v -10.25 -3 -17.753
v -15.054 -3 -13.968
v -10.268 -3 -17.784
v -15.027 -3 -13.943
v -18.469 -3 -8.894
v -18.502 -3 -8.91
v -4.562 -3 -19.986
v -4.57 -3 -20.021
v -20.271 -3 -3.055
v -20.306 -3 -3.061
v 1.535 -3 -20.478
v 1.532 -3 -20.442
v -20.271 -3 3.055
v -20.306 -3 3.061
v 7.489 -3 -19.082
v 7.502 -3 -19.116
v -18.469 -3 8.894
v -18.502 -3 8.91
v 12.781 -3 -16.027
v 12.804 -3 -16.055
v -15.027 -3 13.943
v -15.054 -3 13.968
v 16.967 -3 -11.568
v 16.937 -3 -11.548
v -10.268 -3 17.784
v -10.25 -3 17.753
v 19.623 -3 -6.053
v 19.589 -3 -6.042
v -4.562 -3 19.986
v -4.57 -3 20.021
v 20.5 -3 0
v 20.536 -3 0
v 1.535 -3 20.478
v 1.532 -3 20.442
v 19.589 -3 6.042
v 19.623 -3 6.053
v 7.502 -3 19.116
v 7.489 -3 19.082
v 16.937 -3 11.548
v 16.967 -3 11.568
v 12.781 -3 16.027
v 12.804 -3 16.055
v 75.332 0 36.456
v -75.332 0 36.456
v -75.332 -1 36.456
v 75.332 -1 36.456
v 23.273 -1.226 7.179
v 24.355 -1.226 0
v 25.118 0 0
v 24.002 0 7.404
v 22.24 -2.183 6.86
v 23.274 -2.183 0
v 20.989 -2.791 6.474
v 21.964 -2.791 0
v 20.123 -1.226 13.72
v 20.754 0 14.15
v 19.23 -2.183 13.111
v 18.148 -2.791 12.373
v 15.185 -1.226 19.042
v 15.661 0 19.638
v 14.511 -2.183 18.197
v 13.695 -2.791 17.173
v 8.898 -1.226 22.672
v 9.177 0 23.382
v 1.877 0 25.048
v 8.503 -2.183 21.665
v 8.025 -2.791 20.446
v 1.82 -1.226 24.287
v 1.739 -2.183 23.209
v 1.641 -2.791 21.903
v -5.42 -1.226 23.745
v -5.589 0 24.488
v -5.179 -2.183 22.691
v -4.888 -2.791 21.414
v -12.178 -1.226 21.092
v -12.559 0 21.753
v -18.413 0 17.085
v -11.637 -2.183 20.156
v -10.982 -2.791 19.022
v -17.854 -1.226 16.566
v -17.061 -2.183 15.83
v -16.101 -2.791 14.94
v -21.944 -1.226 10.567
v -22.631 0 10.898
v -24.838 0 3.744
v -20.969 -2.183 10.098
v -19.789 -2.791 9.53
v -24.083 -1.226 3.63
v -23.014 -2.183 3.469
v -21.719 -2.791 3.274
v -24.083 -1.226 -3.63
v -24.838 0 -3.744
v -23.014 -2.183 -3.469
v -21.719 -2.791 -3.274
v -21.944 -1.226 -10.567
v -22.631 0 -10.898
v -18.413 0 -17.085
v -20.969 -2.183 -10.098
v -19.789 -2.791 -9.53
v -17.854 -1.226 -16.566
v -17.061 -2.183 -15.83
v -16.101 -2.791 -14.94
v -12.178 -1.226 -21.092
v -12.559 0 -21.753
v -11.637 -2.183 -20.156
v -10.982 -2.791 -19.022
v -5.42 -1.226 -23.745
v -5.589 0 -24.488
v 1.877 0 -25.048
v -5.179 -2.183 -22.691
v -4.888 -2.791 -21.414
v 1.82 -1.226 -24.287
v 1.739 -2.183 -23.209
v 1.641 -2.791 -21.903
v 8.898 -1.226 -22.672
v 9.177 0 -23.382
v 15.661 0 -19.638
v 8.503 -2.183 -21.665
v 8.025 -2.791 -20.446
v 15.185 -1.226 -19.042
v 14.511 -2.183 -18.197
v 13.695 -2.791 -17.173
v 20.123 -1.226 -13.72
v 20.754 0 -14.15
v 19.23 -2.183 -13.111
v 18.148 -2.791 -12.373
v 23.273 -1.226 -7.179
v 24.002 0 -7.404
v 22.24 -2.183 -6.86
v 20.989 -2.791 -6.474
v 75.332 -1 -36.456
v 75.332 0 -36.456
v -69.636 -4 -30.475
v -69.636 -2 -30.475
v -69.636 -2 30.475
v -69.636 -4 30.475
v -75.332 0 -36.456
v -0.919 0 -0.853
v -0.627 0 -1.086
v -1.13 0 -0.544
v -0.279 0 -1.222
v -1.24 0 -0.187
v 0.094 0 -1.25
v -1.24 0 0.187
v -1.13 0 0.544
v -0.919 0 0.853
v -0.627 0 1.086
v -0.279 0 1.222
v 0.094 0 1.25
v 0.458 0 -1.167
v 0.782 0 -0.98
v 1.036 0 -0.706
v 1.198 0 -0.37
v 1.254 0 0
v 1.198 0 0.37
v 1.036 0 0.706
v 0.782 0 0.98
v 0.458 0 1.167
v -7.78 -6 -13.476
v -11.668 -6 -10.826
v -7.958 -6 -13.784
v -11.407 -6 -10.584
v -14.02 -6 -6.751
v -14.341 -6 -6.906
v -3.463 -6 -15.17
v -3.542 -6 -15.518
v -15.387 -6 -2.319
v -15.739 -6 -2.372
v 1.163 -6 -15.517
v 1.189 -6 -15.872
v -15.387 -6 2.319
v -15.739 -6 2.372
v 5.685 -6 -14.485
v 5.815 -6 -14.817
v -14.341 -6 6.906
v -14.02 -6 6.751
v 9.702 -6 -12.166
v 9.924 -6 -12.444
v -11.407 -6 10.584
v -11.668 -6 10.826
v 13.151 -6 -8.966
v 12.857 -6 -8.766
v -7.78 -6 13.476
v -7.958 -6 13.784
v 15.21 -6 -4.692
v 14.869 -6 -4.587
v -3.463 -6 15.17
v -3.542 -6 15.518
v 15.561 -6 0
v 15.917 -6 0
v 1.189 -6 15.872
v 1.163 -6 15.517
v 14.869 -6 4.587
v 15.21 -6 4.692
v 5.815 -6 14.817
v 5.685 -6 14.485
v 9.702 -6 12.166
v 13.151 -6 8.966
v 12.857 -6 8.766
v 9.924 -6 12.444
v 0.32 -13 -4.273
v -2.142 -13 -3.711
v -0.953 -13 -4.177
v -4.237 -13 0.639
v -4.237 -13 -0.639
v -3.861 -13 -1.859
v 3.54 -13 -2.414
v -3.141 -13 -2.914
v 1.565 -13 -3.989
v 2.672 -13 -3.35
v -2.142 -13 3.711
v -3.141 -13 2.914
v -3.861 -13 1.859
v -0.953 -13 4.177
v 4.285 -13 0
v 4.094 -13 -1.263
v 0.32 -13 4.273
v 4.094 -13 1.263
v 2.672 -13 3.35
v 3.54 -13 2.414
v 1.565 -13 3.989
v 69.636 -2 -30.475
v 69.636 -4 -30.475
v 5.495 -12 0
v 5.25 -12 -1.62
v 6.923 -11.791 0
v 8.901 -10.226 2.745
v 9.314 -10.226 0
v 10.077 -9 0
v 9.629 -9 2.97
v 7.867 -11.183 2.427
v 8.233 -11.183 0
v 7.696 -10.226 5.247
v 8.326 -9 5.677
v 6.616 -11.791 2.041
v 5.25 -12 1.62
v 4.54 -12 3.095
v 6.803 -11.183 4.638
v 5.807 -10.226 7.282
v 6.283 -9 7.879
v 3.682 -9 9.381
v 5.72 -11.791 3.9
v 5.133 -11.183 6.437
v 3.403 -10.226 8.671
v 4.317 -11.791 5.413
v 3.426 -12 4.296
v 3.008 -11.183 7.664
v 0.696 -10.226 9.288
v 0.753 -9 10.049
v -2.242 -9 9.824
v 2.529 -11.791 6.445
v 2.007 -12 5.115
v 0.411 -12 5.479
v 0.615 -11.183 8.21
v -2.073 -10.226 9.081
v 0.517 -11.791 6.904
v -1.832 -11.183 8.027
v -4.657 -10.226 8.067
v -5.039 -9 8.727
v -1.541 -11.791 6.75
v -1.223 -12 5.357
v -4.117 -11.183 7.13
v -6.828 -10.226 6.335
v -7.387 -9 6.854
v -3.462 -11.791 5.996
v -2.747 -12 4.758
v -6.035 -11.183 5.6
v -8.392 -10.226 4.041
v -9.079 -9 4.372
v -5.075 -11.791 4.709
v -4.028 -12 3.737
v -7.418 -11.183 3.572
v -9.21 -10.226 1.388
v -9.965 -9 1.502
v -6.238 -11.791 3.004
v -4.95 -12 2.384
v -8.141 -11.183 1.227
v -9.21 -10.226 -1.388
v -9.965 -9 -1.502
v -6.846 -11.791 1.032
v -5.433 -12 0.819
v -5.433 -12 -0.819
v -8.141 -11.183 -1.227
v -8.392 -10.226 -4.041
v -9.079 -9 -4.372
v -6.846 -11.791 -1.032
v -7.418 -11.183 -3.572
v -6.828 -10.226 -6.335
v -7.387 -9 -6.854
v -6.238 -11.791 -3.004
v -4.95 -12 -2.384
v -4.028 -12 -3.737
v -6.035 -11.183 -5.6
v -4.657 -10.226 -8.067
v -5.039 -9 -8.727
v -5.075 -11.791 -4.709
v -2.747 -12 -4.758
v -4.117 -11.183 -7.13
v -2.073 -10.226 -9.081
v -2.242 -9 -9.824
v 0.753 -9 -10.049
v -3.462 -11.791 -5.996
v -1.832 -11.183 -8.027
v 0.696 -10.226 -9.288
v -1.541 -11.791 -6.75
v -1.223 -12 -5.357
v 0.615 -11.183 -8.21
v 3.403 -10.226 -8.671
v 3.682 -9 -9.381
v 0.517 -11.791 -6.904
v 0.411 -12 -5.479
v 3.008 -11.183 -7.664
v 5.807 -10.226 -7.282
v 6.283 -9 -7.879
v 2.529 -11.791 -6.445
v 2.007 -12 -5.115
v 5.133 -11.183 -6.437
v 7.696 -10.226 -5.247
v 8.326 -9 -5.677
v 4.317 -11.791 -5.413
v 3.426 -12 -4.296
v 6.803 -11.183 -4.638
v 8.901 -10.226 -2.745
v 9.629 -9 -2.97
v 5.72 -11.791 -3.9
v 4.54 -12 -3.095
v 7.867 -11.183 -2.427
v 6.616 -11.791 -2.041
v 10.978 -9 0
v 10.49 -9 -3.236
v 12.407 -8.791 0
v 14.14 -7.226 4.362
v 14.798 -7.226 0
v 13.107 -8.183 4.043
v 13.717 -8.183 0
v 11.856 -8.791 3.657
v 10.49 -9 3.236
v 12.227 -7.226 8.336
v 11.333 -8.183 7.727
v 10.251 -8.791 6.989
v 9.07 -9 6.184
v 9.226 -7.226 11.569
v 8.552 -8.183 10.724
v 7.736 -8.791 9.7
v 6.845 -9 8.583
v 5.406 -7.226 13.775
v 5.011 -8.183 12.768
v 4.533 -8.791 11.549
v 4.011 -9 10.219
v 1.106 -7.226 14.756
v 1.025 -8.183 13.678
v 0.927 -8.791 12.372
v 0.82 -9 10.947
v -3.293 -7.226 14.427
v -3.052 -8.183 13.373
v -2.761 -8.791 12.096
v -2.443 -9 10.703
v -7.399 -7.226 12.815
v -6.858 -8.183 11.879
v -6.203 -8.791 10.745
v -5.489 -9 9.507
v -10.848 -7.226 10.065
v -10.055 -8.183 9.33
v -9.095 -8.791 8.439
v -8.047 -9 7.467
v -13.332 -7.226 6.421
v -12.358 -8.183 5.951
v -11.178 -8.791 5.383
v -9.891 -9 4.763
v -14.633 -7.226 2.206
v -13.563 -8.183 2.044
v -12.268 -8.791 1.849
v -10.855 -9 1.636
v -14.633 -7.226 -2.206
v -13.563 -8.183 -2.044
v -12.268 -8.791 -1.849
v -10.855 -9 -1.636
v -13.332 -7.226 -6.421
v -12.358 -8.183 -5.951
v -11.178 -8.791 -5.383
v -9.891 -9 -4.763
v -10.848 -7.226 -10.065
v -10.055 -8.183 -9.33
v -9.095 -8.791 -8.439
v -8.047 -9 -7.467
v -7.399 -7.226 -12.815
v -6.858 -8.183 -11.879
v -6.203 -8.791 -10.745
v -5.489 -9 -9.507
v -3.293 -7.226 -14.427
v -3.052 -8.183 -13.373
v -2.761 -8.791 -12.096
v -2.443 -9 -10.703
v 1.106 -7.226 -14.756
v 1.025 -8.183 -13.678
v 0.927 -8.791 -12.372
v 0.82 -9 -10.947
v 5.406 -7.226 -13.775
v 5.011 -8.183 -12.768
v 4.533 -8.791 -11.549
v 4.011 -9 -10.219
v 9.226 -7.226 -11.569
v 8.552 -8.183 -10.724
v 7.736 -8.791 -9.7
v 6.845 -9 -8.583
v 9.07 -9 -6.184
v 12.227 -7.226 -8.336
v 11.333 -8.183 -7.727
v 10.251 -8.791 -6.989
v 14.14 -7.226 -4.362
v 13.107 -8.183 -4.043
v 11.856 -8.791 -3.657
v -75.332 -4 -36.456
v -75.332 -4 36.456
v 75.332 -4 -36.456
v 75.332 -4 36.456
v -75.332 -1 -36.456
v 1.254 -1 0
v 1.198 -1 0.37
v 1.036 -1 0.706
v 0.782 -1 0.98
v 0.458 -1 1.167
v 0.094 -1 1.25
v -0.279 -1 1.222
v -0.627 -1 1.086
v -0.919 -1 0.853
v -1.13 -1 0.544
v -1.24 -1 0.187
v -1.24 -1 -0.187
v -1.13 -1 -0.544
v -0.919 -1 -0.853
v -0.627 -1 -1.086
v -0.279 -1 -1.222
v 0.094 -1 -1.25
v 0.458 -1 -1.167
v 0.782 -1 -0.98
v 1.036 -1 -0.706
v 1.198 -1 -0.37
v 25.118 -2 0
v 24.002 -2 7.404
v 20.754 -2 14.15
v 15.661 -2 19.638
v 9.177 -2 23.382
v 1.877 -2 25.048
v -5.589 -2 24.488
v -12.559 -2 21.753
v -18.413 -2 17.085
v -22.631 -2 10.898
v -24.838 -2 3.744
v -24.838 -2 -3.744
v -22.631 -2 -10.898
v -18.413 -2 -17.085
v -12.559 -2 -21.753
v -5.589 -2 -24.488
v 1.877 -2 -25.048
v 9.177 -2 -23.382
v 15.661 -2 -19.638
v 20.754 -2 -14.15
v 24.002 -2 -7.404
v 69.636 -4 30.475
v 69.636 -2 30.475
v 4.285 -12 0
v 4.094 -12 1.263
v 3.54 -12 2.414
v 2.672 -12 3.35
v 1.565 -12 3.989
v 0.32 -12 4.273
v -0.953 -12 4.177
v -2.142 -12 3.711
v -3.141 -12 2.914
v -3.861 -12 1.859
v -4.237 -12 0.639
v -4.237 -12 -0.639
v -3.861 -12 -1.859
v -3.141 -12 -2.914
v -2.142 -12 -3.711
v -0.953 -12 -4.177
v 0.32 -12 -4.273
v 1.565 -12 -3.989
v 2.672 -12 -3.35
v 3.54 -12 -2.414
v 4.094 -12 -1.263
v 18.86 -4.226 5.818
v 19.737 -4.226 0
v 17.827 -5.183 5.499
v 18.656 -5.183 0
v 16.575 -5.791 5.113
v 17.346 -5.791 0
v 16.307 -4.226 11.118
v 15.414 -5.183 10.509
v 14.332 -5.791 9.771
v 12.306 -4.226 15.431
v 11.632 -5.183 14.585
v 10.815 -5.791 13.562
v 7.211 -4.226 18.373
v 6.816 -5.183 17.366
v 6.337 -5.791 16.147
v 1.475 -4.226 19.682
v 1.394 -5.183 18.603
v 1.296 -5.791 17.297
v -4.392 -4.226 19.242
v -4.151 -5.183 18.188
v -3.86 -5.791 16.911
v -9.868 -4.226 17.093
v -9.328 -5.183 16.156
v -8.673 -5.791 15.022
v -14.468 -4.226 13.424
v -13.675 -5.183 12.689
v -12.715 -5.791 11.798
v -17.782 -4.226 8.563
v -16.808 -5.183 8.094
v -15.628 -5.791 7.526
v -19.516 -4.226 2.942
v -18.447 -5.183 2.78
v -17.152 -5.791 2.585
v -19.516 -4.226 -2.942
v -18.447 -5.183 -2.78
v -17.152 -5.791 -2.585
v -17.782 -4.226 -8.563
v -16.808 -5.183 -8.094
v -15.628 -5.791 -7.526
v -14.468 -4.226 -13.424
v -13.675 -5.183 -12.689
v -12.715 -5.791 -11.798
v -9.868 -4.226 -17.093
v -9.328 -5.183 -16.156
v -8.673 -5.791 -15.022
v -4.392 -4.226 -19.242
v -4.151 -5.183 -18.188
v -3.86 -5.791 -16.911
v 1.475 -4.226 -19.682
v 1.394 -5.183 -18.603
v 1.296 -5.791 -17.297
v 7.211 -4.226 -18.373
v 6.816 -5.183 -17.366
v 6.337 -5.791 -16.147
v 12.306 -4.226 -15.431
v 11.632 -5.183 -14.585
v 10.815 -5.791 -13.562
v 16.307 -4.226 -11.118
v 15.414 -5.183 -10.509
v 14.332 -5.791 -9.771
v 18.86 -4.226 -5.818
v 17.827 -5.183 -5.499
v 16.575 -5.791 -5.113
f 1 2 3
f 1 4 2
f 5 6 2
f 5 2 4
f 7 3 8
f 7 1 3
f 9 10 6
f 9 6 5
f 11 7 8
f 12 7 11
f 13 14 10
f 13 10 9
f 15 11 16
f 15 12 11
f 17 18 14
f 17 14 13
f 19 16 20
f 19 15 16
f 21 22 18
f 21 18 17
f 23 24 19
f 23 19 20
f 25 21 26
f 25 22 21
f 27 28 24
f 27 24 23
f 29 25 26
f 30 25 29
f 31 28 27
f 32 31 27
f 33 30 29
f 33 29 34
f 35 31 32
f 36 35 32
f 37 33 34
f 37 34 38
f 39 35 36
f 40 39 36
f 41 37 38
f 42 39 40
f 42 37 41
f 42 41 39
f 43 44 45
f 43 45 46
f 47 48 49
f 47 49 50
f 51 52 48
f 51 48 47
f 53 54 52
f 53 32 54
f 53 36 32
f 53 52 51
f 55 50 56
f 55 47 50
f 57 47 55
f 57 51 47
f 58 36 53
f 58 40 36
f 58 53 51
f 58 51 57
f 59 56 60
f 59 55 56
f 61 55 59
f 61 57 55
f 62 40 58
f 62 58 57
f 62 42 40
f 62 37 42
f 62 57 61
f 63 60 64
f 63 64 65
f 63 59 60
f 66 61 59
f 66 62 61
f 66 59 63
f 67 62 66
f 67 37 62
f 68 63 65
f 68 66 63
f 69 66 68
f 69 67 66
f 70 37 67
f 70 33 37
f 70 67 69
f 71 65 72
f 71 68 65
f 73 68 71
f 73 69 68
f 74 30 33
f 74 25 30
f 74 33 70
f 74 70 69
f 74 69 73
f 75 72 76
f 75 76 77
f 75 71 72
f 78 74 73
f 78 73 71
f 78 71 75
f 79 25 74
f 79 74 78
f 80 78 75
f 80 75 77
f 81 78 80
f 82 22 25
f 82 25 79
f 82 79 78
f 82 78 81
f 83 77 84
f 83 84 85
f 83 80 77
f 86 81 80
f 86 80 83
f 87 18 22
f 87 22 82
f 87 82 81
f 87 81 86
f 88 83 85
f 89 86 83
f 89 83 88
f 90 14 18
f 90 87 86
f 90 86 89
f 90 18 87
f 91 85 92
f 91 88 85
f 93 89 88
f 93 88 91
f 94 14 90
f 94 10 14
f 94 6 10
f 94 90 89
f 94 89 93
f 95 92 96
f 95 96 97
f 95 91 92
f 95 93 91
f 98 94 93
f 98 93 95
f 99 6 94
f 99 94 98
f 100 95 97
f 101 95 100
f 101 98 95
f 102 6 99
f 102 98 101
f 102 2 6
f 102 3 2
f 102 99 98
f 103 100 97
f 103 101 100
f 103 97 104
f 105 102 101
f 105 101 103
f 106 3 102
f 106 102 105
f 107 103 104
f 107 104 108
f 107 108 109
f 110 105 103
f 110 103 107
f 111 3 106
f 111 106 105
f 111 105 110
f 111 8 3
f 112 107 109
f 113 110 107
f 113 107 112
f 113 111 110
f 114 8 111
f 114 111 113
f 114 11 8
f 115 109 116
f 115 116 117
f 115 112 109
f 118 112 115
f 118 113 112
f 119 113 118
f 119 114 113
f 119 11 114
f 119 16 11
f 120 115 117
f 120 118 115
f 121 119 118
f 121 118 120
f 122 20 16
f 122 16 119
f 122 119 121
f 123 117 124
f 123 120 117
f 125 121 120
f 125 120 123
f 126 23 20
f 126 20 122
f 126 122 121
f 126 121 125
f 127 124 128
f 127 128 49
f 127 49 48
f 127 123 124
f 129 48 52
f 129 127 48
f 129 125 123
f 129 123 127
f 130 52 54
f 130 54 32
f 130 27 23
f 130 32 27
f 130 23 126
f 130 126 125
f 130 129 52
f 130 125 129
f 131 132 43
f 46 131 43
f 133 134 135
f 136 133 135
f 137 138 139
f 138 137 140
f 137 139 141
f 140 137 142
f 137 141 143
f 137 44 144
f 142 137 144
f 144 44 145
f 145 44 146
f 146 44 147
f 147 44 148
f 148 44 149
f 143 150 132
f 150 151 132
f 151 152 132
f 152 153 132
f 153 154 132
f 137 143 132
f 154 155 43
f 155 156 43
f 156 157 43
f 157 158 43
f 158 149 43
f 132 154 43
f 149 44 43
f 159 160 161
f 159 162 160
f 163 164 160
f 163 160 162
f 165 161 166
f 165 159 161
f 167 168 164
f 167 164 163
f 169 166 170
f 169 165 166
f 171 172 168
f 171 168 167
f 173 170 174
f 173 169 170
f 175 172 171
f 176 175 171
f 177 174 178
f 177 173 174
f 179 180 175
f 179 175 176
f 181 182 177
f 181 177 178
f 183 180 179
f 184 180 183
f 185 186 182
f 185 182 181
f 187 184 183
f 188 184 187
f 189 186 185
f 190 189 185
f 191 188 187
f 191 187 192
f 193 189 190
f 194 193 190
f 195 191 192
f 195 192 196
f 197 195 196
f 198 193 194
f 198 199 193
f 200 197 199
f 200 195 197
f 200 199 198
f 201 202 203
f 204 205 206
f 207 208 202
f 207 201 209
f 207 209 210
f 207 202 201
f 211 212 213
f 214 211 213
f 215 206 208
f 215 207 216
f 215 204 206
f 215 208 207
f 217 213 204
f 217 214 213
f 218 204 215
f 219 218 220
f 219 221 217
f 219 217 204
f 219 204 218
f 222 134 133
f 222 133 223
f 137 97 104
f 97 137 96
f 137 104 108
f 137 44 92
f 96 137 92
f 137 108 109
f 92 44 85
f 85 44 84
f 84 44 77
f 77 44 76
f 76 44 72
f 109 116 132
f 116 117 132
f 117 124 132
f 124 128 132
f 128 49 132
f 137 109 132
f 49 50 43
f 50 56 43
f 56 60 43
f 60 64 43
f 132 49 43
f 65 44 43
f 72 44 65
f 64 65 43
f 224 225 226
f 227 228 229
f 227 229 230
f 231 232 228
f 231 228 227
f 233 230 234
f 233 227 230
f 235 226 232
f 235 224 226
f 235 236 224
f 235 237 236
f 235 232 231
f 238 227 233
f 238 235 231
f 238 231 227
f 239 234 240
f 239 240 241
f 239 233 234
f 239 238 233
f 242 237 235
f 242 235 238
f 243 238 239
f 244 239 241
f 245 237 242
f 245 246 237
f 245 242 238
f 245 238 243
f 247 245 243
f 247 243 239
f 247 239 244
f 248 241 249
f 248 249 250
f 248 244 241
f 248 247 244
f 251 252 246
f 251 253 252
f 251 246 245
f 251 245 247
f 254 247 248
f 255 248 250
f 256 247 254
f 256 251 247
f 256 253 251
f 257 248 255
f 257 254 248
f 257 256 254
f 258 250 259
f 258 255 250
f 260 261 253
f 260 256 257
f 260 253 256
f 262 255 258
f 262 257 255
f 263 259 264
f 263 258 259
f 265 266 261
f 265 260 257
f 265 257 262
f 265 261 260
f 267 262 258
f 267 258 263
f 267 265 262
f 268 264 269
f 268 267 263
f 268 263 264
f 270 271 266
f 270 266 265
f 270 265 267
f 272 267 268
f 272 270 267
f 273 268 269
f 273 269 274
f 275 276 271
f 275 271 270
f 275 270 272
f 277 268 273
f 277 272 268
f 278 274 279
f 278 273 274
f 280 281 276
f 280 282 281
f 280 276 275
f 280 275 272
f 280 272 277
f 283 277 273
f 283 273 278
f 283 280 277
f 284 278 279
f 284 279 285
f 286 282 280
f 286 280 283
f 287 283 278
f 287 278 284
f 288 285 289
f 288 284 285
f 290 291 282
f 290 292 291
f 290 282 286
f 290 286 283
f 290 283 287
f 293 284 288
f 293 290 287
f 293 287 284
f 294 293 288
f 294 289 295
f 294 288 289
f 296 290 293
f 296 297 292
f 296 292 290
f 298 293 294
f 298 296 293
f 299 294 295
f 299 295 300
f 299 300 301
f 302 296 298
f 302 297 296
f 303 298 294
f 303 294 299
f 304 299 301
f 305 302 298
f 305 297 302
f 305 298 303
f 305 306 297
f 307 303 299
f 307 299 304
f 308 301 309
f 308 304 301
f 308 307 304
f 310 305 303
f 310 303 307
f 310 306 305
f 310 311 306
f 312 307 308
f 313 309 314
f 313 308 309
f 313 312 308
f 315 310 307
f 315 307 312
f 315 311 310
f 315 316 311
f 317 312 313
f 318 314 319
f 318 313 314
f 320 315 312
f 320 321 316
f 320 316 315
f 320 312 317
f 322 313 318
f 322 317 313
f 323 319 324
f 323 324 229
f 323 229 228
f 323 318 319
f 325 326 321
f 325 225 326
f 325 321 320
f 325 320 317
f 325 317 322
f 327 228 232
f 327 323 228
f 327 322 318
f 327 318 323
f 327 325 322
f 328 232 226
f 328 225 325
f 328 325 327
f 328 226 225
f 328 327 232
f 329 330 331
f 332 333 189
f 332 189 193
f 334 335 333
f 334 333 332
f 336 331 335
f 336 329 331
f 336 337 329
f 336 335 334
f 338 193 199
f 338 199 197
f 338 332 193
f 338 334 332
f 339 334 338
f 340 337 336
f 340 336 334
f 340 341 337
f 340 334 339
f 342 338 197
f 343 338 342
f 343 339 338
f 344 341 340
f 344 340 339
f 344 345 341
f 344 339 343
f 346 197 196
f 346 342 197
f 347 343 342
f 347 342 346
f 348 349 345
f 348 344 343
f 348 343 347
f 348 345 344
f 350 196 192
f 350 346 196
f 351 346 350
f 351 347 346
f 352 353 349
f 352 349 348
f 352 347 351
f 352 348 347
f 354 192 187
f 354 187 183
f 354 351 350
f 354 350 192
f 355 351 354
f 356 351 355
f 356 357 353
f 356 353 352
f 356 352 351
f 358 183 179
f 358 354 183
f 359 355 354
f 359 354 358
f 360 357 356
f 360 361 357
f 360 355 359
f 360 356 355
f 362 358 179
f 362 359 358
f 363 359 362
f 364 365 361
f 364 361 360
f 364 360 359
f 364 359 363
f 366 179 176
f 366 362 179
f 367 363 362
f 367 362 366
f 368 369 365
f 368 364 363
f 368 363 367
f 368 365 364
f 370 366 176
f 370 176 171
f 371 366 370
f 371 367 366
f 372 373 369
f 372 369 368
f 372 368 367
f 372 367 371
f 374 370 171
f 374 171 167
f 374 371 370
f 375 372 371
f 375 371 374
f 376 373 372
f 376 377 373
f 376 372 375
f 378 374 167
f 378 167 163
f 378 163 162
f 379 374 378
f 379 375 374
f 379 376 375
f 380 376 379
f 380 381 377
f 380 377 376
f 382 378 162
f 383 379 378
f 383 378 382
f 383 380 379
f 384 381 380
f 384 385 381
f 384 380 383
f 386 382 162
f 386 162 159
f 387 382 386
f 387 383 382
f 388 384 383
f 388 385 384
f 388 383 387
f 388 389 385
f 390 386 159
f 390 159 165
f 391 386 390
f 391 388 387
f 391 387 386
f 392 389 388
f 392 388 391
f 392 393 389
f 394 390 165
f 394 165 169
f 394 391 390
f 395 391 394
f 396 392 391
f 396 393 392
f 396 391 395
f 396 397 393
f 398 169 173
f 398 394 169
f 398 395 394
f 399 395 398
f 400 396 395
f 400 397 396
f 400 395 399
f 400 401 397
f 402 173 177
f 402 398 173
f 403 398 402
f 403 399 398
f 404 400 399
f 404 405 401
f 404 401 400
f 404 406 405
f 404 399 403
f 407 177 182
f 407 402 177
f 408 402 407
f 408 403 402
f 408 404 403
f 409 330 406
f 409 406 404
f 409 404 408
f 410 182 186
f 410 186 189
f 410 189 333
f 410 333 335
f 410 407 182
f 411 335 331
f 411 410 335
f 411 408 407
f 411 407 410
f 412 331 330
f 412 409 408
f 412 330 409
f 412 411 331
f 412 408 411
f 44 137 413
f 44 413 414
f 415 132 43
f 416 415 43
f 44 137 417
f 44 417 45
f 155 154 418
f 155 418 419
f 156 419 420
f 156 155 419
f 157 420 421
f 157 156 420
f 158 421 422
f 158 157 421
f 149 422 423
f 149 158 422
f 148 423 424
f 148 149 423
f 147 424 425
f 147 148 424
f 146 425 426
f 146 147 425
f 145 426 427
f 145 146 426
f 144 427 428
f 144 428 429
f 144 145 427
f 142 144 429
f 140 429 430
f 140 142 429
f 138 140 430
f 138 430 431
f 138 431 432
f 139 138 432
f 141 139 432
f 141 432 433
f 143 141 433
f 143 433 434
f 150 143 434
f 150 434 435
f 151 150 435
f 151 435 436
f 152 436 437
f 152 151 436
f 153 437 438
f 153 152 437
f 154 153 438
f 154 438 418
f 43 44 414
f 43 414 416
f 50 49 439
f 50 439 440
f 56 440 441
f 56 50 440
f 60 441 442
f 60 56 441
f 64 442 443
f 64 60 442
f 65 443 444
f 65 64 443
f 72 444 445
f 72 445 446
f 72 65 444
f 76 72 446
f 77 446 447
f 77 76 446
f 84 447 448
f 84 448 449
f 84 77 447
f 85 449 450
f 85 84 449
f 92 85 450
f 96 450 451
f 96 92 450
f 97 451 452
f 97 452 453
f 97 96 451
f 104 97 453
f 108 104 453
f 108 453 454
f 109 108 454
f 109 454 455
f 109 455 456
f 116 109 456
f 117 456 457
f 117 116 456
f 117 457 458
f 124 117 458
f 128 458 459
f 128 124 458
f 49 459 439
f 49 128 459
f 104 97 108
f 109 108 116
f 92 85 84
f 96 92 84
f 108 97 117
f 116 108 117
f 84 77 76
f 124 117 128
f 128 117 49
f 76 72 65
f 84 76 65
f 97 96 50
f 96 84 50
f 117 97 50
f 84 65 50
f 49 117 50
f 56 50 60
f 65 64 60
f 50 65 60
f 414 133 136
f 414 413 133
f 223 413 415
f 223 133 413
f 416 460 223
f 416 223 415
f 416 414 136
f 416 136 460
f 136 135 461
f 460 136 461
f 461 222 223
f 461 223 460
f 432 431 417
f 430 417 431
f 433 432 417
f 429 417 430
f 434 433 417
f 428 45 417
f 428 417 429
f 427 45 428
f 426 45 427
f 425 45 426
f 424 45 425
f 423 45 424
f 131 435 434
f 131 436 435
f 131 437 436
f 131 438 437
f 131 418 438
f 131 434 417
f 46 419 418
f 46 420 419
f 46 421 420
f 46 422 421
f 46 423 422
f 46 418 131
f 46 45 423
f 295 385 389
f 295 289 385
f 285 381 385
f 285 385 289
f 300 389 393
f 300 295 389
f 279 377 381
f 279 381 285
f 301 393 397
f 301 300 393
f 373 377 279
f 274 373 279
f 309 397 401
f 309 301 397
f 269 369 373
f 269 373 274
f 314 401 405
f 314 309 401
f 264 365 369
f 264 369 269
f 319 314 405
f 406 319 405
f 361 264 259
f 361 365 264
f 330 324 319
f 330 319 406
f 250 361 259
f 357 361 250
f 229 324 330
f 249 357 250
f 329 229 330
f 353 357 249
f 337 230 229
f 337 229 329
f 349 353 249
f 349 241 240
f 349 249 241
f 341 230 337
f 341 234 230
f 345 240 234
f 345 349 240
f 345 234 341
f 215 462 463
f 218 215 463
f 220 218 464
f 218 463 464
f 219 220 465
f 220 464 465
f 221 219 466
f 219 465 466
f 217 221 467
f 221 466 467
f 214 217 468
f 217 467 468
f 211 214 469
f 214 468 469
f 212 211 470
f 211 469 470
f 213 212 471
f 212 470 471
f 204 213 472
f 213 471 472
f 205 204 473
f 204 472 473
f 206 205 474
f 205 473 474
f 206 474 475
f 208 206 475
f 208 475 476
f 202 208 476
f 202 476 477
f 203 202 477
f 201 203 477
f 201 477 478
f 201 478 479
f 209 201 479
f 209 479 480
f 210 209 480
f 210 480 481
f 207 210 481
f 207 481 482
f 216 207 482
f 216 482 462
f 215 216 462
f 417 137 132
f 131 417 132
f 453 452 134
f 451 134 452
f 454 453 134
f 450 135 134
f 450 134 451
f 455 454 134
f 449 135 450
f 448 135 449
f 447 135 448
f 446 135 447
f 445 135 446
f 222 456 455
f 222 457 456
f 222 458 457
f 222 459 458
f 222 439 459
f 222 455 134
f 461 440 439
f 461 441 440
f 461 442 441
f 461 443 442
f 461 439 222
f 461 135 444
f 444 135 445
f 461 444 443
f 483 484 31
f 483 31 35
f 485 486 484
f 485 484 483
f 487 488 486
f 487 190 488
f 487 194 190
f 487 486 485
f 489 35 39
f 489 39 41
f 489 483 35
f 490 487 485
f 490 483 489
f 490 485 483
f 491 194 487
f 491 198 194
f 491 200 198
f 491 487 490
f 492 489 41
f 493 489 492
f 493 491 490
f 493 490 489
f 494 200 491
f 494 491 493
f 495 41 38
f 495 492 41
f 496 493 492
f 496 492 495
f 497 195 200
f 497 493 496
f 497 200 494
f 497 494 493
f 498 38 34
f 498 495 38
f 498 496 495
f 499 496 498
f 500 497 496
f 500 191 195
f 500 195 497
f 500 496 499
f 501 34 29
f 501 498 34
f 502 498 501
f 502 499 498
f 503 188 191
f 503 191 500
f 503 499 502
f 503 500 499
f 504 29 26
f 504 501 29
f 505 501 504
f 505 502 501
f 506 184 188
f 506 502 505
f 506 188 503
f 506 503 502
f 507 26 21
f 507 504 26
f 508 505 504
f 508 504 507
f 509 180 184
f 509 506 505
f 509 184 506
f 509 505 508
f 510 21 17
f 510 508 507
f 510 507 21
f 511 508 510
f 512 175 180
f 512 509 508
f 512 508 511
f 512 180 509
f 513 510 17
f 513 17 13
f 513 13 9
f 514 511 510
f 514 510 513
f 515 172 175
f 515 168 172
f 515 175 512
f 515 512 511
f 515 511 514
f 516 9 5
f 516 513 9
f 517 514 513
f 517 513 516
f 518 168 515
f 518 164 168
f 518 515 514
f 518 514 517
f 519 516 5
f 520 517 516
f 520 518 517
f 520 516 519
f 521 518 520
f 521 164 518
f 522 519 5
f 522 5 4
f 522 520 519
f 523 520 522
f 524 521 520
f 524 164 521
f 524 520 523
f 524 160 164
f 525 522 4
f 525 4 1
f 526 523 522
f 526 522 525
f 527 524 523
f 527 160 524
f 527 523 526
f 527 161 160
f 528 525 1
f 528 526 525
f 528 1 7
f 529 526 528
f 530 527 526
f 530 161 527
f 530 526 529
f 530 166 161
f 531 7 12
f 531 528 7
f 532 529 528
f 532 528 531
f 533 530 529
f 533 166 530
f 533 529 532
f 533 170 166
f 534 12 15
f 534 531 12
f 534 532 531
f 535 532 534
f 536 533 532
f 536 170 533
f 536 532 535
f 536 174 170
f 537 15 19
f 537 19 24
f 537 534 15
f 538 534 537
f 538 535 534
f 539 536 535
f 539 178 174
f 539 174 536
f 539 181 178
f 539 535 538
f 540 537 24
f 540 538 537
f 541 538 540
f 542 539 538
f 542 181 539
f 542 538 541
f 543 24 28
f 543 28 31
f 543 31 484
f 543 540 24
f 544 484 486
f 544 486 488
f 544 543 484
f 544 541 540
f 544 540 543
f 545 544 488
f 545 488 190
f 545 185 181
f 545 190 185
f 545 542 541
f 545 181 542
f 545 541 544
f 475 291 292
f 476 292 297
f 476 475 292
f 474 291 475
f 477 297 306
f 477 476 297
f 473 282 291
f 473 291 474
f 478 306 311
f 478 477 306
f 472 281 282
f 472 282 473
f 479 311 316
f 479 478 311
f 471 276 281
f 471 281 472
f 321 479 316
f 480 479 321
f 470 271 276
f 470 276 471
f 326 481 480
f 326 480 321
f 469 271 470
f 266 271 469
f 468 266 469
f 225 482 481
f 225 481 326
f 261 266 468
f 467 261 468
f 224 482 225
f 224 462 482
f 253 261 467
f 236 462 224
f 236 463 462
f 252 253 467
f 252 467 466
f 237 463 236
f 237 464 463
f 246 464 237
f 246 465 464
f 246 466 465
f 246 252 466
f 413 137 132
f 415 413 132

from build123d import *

# Parameters (mm, degrees)
F0_R      = 25.1181711361
F0_R_2    = 20.4995111856
F1_DEPTH  = 3
F0_R_3    = 15.560509686
F2_DEPTH  = 6
F0_R_4    = 10.0770984701
F3_DEPTH  = 9
F0_R_5    = 4.2848341216
F4_DEPTH  = 12
F0_R_6    = 1.2539122761
F5_DEPTH  = 13
F6_DEPTH  = 13
F0_W      = 150.6645679474
F0_H      = 72.9113966227
F0_W_2    = 139.2721533775
F0_H_2    = 60.949370265
F8_DEPTH  = 4
F9_DEPTH  = 2
F10_DEPTH = 1


# Not quite as in the source:
# - a fillet or chamfer that OpenCascade refuses, or shapes differently, is made with other operations: its cross-section is extruded or revolved along the edge and cut away or added


with BuildPart() as f1:
    # F0 (on Front) → F1 (new body)
    with BuildSketch(Plane.XZ):
        Circle(F0_R)
        Circle(F0_R_2, mode=Mode.SUBTRACT)
    extrude(amount=F1_DEPTH)

    # F0 (on Front) → F2 (join)
    with BuildSketch(Plane.XZ):
        Circle(F0_R_2)
        Circle(F0_R_3, mode=Mode.SUBTRACT)
    extrude(amount=F2_DEPTH)

    # F0 (on Front) → F3 (join)
    with BuildSketch(Plane.XZ):
        Circle(F0_R_3)
        Circle(F0_R_4, mode=Mode.SUBTRACT)
    extrude(amount=F3_DEPTH)

    # F0 (on Front) → F4 (join)
    with BuildSketch(Plane.XZ):
        Circle(F0_R_4)
        Circle(F0_R_5, mode=Mode.SUBTRACT)
    extrude(amount=F4_DEPTH)

    # F0 (on Front) → F5 (join)
    with BuildSketch(Plane.XZ):
        Circle(F0_R_5)
        Circle(F0_R_6, mode=Mode.SUBTRACT)
    extrude(amount=F5_DEPTH)

    # F0 (on Front) → F6 (join)
    with BuildSketch(Plane.XZ):
        Circle(F0_R_6)
    extrude(amount=F6_DEPTH)

    # F7: fillet of radius 5 on 4 edges, made by hand

    # F7_s1 → F7_t2 (revolve, cut)
    with BuildSketch(Plane.XY):
        with BuildLine():
            ThreePointArc((25.1181711361, 0), (23.2742082286, -2.1833001327), (20.5355954411, -3))
            Line((20.5355954411, -3), (25.1181711361, -3))
            Line((25.1181711361, -3), (25.1181711361, 0))
        make_face()
    revolve(axis=Axis((0, -3, 0), (0, -1, 0)), mode=Mode.SUBTRACT)

    # F7_s3 → F7_t4 (revolve, cut)
    with BuildSketch(Plane.XY):
        with BuildLine():
            ThreePointArc((20.4995111856, -3), (18.6555482782, -5.1833001327), (15.9169354907, -6))
            Line((15.9169354907, -6), (20.4995111856, -6))
            Line((20.4995111856, -6), (20.4995111856, -3))
        make_face()
    revolve(axis=Axis((0, -6, 0), (0, -1, 0)), mode=Mode.SUBTRACT)

    # F7_s5 → F7_t6 (revolve, cut)
    with BuildSketch(Plane.XY):
        with BuildLine():
            ThreePointArc((15.560509686, -6), (13.7165467785, -8.1833001327), (10.977933991, -9))
            Line((10.977933991, -9), (15.560509686, -9))
            Line((15.560509686, -9), (15.560509686, -6))
        make_face()
    revolve(axis=Axis((0, -9, 0), (0, -1, 0)), mode=Mode.SUBTRACT)

    # F7_s7 → F7_t8 (revolve, cut)
    with BuildSketch(Plane.XY):
        with BuildLine():
            ThreePointArc((10.0770984701, -9), (8.2331355627, -11.1833001327), (5.4945227752, -12))
            Line((5.4945227752, -12), (10.0770984701, -12))
            Line((10.0770984701, -12), (10.0770984701, -9))
        make_face()
    revolve(axis=Axis((0, -12, 0), (0, -1, 0)), mode=Mode.SUBTRACT)


with BuildPart() as f8:
    # F0 (on Front) → F8 (new body)
    with BuildSketch(Plane.XZ):
        Rectangle(F0_W, F0_H)
        Rectangle(F0_W_2, F0_H_2, mode=Mode.SUBTRACT)
    extrude(amount=F8_DEPTH)

    # F0 (on Front) → F9 (join)
    with BuildSketch(Plane.XZ):
        Rectangle(F0_W_2, F0_H_2)
        Circle(F0_R, mode=Mode.SUBTRACT)
    extrude(amount=F9_DEPTH)


with BuildPart() as f10:
    # F0 (on Front) → F10 (new body)
    with BuildSketch(Plane.XZ):
        Rectangle(F0_W, F0_H)
        Rectangle(F0_W_2, F0_H_2, mode=Mode.SUBTRACT)
        Rectangle(F0_W_2, F0_H_2)
        Circle(F0_R, mode=Mode.SUBTRACT)
        Circle(F0_R)
        Circle(F0_R_2, mode=Mode.SUBTRACT)
        Circle(F0_R_2)
        Circle(F0_R_3, mode=Mode.SUBTRACT)
        Circle(F0_R_3)
        Circle(F0_R_4, mode=Mode.SUBTRACT)
        Circle(F0_R_4)
        Circle(F0_R_5, mode=Mode.SUBTRACT)
        Circle(F0_R_5)
        Circle(F0_R_6, mode=Mode.SUBTRACT)
    extrude(amount=F10_DEPTH)


solid = Compound([f1.part, f8.part, f10.part])
